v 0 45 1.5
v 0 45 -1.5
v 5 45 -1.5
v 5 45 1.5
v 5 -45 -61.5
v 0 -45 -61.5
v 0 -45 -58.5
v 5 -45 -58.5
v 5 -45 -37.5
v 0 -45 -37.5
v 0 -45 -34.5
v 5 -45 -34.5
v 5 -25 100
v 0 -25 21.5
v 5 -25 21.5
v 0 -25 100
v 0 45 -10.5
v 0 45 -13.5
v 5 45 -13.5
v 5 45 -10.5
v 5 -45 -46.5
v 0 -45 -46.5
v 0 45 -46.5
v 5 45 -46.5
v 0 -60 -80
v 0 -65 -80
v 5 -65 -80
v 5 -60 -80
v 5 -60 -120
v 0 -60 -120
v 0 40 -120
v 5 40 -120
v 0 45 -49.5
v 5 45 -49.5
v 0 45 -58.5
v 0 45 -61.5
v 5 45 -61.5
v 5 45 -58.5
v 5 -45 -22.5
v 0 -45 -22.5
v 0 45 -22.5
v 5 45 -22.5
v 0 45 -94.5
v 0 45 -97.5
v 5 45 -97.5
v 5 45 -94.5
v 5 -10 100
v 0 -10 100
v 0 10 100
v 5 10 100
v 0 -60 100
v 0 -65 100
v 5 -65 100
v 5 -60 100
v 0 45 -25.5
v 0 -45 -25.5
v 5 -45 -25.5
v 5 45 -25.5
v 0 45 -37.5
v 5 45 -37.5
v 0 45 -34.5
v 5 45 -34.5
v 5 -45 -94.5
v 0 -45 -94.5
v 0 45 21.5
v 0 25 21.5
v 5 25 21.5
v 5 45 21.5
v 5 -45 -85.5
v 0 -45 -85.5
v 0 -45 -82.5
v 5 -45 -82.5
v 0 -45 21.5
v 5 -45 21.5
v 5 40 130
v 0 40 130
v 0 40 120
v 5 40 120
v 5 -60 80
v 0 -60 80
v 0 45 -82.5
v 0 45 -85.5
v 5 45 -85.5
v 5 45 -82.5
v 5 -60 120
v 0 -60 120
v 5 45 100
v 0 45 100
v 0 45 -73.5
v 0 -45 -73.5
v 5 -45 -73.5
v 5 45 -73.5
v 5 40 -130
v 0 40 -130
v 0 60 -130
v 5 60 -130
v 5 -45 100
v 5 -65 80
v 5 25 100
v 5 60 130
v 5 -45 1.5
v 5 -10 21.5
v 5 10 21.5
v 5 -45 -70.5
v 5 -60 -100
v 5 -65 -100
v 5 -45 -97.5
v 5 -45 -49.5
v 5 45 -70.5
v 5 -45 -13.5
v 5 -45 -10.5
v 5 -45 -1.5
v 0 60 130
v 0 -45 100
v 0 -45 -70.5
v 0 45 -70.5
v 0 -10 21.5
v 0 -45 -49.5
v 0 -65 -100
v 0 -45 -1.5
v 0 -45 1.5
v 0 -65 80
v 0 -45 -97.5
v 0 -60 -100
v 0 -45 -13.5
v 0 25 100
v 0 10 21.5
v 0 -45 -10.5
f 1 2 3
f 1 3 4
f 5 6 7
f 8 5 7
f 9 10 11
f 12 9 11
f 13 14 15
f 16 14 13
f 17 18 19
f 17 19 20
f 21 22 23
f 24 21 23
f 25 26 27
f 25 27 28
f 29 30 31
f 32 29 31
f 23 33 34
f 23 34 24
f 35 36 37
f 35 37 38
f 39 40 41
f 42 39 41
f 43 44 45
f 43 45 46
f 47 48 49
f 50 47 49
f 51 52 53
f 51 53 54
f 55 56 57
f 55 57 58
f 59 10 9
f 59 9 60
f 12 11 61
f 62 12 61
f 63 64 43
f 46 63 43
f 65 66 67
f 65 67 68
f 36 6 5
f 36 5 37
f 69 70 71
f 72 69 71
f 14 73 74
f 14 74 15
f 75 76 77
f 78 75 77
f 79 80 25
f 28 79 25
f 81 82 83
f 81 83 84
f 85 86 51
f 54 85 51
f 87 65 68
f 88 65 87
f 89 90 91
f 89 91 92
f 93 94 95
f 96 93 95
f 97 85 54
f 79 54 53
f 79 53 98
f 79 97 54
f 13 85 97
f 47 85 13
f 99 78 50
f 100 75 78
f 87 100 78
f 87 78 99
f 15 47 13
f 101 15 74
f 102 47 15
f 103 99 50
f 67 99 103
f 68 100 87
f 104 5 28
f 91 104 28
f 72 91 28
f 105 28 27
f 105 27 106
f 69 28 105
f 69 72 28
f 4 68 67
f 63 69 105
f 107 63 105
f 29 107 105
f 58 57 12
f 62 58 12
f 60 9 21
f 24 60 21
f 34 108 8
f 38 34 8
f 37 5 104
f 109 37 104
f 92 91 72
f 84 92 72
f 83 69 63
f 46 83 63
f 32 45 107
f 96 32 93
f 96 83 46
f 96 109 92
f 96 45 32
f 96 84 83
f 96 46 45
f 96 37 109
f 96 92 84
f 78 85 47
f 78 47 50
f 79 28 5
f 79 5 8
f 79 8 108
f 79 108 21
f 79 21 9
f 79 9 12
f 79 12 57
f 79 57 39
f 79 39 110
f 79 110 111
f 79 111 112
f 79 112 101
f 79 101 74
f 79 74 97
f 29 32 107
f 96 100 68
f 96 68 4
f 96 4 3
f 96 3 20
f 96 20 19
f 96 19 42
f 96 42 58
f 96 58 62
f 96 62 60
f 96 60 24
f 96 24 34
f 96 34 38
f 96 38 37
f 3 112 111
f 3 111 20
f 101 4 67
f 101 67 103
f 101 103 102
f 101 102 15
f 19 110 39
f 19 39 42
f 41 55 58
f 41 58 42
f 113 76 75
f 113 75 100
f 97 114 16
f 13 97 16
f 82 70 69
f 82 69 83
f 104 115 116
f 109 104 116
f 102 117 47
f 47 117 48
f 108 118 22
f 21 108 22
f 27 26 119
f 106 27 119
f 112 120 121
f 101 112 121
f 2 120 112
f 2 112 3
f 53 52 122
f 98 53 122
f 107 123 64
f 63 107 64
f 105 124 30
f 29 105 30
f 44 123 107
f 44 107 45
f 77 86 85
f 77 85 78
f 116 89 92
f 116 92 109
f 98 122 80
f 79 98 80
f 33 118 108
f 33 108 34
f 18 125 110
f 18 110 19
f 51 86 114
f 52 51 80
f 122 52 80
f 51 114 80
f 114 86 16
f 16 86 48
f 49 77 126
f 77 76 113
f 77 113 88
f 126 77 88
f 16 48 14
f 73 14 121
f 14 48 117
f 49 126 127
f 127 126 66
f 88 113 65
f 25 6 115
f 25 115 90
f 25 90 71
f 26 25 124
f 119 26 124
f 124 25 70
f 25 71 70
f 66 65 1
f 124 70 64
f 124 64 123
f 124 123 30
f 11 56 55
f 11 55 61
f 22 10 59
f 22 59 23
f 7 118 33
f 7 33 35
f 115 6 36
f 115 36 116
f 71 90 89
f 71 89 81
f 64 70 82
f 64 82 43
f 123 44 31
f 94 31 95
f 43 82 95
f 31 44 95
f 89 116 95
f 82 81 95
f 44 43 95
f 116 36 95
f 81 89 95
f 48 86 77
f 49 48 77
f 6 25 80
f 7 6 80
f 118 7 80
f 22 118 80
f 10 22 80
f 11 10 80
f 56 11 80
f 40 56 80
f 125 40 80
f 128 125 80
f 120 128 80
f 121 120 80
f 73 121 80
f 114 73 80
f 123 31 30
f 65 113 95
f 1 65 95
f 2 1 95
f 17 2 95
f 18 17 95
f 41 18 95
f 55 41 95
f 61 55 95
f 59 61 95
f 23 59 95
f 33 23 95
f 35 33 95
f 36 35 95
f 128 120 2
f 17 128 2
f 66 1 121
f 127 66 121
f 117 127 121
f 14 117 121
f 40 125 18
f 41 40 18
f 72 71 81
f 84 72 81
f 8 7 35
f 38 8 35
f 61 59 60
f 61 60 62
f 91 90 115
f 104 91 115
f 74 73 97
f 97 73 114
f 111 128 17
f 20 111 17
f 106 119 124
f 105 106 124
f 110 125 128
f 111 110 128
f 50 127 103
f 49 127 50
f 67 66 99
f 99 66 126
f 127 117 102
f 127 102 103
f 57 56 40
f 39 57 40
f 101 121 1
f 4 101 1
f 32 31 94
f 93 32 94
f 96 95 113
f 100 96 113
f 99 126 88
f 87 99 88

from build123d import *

# Parameters (mm, degrees)
SKIZZE2_W                       = 240
SKIZZE2_H                       = 120
SKIZZE2_W_2                     = 10
SKIZZE2_H_2                     = 20
SKIZZE2_W_3                     = 20
SKIZZE2_H_3                     = 5
AUFSATZ_LINEAR_AUSTRAGEN1_DEPTH = 5
SKIZZE3_W                       = 3
SKIZZE3_H                       = 90
SCHNITT_LINEAR_AUSTRAGEN1_DEPTH = 146.430395722
LINEARES_MUSTER1_COUNT          = 9
LINEARES_MUSTER1_PITCH          = 12
SKIZZE4_W                       = 78.5
SKIZZE4_H                       = 20
SCHNITT_LINEAR_AUSTRAGEN2_DEPTH = 146.430395722


with BuildPart() as part:
    # Skizze2 → Aufsatz-Linear austragen1 (new body)
    with BuildSketch(Plane(origin=(0, 0, 0), x_dir=(0, 0, -1), z_dir=(1, 0, 0))):
        Rectangle(SKIZZE2_W, SKIZZE2_H)
        with Locations((-125, 50)):
            Rectangle(SKIZZE2_W_2, SKIZZE2_H_2)
        with Locations((125, 50)):
            Rectangle(SKIZZE2_W_2, SKIZZE2_H_2)
        with Locations((-90, -62.5)):
            Rectangle(SKIZZE2_W_3, SKIZZE2_H_3)
        with Locations((90, -62.5)):
            Rectangle(SKIZZE2_W_3, SKIZZE2_H_3)
    extrude(amount=AUFSATZ_LINEAR_AUSTRAGEN1_DEPTH)

    # Skizze3 → Schnitt-Linear austragen1 (cut, through all)
    with BuildSketch(Plane.ZY):
        Rectangle(SKIZZE3_W, SKIZZE3_H)
    schnitt_linear_austragen1 = extrude(amount=-SCHNITT_LINEAR_AUSTRAGEN1_DEPTH, mode=Mode.SUBTRACT)

    # Lineares Muster1: Schnitt-Linear austragen1 ×9
    with Locations(*[(0, 0, -i * LINEARES_MUSTER1_PITCH) for i in range(1, LINEARES_MUSTER1_COUNT)]):
        add(schnitt_linear_austragen1, mode=Mode.SUBTRACT)

    # Skizze4 → Schnitt-Linear austragen2 (cut, through all)
    with BuildSketch(Plane.ZY):
        with Locations((60.75, 0)):
            Rectangle(SKIZZE4_W, SKIZZE4_H)
        with Locations((60.75, -35)):
            Rectangle(SKIZZE4_W, SKIZZE4_H)
        with Locations((60.75, 35)):
            Rectangle(SKIZZE4_W, SKIZZE4_H)
    extrude(amount=-SCHNITT_LINEAR_AUSTRAGEN2_DEPTH, mode=Mode.SUBTRACT)


solid = part.part
